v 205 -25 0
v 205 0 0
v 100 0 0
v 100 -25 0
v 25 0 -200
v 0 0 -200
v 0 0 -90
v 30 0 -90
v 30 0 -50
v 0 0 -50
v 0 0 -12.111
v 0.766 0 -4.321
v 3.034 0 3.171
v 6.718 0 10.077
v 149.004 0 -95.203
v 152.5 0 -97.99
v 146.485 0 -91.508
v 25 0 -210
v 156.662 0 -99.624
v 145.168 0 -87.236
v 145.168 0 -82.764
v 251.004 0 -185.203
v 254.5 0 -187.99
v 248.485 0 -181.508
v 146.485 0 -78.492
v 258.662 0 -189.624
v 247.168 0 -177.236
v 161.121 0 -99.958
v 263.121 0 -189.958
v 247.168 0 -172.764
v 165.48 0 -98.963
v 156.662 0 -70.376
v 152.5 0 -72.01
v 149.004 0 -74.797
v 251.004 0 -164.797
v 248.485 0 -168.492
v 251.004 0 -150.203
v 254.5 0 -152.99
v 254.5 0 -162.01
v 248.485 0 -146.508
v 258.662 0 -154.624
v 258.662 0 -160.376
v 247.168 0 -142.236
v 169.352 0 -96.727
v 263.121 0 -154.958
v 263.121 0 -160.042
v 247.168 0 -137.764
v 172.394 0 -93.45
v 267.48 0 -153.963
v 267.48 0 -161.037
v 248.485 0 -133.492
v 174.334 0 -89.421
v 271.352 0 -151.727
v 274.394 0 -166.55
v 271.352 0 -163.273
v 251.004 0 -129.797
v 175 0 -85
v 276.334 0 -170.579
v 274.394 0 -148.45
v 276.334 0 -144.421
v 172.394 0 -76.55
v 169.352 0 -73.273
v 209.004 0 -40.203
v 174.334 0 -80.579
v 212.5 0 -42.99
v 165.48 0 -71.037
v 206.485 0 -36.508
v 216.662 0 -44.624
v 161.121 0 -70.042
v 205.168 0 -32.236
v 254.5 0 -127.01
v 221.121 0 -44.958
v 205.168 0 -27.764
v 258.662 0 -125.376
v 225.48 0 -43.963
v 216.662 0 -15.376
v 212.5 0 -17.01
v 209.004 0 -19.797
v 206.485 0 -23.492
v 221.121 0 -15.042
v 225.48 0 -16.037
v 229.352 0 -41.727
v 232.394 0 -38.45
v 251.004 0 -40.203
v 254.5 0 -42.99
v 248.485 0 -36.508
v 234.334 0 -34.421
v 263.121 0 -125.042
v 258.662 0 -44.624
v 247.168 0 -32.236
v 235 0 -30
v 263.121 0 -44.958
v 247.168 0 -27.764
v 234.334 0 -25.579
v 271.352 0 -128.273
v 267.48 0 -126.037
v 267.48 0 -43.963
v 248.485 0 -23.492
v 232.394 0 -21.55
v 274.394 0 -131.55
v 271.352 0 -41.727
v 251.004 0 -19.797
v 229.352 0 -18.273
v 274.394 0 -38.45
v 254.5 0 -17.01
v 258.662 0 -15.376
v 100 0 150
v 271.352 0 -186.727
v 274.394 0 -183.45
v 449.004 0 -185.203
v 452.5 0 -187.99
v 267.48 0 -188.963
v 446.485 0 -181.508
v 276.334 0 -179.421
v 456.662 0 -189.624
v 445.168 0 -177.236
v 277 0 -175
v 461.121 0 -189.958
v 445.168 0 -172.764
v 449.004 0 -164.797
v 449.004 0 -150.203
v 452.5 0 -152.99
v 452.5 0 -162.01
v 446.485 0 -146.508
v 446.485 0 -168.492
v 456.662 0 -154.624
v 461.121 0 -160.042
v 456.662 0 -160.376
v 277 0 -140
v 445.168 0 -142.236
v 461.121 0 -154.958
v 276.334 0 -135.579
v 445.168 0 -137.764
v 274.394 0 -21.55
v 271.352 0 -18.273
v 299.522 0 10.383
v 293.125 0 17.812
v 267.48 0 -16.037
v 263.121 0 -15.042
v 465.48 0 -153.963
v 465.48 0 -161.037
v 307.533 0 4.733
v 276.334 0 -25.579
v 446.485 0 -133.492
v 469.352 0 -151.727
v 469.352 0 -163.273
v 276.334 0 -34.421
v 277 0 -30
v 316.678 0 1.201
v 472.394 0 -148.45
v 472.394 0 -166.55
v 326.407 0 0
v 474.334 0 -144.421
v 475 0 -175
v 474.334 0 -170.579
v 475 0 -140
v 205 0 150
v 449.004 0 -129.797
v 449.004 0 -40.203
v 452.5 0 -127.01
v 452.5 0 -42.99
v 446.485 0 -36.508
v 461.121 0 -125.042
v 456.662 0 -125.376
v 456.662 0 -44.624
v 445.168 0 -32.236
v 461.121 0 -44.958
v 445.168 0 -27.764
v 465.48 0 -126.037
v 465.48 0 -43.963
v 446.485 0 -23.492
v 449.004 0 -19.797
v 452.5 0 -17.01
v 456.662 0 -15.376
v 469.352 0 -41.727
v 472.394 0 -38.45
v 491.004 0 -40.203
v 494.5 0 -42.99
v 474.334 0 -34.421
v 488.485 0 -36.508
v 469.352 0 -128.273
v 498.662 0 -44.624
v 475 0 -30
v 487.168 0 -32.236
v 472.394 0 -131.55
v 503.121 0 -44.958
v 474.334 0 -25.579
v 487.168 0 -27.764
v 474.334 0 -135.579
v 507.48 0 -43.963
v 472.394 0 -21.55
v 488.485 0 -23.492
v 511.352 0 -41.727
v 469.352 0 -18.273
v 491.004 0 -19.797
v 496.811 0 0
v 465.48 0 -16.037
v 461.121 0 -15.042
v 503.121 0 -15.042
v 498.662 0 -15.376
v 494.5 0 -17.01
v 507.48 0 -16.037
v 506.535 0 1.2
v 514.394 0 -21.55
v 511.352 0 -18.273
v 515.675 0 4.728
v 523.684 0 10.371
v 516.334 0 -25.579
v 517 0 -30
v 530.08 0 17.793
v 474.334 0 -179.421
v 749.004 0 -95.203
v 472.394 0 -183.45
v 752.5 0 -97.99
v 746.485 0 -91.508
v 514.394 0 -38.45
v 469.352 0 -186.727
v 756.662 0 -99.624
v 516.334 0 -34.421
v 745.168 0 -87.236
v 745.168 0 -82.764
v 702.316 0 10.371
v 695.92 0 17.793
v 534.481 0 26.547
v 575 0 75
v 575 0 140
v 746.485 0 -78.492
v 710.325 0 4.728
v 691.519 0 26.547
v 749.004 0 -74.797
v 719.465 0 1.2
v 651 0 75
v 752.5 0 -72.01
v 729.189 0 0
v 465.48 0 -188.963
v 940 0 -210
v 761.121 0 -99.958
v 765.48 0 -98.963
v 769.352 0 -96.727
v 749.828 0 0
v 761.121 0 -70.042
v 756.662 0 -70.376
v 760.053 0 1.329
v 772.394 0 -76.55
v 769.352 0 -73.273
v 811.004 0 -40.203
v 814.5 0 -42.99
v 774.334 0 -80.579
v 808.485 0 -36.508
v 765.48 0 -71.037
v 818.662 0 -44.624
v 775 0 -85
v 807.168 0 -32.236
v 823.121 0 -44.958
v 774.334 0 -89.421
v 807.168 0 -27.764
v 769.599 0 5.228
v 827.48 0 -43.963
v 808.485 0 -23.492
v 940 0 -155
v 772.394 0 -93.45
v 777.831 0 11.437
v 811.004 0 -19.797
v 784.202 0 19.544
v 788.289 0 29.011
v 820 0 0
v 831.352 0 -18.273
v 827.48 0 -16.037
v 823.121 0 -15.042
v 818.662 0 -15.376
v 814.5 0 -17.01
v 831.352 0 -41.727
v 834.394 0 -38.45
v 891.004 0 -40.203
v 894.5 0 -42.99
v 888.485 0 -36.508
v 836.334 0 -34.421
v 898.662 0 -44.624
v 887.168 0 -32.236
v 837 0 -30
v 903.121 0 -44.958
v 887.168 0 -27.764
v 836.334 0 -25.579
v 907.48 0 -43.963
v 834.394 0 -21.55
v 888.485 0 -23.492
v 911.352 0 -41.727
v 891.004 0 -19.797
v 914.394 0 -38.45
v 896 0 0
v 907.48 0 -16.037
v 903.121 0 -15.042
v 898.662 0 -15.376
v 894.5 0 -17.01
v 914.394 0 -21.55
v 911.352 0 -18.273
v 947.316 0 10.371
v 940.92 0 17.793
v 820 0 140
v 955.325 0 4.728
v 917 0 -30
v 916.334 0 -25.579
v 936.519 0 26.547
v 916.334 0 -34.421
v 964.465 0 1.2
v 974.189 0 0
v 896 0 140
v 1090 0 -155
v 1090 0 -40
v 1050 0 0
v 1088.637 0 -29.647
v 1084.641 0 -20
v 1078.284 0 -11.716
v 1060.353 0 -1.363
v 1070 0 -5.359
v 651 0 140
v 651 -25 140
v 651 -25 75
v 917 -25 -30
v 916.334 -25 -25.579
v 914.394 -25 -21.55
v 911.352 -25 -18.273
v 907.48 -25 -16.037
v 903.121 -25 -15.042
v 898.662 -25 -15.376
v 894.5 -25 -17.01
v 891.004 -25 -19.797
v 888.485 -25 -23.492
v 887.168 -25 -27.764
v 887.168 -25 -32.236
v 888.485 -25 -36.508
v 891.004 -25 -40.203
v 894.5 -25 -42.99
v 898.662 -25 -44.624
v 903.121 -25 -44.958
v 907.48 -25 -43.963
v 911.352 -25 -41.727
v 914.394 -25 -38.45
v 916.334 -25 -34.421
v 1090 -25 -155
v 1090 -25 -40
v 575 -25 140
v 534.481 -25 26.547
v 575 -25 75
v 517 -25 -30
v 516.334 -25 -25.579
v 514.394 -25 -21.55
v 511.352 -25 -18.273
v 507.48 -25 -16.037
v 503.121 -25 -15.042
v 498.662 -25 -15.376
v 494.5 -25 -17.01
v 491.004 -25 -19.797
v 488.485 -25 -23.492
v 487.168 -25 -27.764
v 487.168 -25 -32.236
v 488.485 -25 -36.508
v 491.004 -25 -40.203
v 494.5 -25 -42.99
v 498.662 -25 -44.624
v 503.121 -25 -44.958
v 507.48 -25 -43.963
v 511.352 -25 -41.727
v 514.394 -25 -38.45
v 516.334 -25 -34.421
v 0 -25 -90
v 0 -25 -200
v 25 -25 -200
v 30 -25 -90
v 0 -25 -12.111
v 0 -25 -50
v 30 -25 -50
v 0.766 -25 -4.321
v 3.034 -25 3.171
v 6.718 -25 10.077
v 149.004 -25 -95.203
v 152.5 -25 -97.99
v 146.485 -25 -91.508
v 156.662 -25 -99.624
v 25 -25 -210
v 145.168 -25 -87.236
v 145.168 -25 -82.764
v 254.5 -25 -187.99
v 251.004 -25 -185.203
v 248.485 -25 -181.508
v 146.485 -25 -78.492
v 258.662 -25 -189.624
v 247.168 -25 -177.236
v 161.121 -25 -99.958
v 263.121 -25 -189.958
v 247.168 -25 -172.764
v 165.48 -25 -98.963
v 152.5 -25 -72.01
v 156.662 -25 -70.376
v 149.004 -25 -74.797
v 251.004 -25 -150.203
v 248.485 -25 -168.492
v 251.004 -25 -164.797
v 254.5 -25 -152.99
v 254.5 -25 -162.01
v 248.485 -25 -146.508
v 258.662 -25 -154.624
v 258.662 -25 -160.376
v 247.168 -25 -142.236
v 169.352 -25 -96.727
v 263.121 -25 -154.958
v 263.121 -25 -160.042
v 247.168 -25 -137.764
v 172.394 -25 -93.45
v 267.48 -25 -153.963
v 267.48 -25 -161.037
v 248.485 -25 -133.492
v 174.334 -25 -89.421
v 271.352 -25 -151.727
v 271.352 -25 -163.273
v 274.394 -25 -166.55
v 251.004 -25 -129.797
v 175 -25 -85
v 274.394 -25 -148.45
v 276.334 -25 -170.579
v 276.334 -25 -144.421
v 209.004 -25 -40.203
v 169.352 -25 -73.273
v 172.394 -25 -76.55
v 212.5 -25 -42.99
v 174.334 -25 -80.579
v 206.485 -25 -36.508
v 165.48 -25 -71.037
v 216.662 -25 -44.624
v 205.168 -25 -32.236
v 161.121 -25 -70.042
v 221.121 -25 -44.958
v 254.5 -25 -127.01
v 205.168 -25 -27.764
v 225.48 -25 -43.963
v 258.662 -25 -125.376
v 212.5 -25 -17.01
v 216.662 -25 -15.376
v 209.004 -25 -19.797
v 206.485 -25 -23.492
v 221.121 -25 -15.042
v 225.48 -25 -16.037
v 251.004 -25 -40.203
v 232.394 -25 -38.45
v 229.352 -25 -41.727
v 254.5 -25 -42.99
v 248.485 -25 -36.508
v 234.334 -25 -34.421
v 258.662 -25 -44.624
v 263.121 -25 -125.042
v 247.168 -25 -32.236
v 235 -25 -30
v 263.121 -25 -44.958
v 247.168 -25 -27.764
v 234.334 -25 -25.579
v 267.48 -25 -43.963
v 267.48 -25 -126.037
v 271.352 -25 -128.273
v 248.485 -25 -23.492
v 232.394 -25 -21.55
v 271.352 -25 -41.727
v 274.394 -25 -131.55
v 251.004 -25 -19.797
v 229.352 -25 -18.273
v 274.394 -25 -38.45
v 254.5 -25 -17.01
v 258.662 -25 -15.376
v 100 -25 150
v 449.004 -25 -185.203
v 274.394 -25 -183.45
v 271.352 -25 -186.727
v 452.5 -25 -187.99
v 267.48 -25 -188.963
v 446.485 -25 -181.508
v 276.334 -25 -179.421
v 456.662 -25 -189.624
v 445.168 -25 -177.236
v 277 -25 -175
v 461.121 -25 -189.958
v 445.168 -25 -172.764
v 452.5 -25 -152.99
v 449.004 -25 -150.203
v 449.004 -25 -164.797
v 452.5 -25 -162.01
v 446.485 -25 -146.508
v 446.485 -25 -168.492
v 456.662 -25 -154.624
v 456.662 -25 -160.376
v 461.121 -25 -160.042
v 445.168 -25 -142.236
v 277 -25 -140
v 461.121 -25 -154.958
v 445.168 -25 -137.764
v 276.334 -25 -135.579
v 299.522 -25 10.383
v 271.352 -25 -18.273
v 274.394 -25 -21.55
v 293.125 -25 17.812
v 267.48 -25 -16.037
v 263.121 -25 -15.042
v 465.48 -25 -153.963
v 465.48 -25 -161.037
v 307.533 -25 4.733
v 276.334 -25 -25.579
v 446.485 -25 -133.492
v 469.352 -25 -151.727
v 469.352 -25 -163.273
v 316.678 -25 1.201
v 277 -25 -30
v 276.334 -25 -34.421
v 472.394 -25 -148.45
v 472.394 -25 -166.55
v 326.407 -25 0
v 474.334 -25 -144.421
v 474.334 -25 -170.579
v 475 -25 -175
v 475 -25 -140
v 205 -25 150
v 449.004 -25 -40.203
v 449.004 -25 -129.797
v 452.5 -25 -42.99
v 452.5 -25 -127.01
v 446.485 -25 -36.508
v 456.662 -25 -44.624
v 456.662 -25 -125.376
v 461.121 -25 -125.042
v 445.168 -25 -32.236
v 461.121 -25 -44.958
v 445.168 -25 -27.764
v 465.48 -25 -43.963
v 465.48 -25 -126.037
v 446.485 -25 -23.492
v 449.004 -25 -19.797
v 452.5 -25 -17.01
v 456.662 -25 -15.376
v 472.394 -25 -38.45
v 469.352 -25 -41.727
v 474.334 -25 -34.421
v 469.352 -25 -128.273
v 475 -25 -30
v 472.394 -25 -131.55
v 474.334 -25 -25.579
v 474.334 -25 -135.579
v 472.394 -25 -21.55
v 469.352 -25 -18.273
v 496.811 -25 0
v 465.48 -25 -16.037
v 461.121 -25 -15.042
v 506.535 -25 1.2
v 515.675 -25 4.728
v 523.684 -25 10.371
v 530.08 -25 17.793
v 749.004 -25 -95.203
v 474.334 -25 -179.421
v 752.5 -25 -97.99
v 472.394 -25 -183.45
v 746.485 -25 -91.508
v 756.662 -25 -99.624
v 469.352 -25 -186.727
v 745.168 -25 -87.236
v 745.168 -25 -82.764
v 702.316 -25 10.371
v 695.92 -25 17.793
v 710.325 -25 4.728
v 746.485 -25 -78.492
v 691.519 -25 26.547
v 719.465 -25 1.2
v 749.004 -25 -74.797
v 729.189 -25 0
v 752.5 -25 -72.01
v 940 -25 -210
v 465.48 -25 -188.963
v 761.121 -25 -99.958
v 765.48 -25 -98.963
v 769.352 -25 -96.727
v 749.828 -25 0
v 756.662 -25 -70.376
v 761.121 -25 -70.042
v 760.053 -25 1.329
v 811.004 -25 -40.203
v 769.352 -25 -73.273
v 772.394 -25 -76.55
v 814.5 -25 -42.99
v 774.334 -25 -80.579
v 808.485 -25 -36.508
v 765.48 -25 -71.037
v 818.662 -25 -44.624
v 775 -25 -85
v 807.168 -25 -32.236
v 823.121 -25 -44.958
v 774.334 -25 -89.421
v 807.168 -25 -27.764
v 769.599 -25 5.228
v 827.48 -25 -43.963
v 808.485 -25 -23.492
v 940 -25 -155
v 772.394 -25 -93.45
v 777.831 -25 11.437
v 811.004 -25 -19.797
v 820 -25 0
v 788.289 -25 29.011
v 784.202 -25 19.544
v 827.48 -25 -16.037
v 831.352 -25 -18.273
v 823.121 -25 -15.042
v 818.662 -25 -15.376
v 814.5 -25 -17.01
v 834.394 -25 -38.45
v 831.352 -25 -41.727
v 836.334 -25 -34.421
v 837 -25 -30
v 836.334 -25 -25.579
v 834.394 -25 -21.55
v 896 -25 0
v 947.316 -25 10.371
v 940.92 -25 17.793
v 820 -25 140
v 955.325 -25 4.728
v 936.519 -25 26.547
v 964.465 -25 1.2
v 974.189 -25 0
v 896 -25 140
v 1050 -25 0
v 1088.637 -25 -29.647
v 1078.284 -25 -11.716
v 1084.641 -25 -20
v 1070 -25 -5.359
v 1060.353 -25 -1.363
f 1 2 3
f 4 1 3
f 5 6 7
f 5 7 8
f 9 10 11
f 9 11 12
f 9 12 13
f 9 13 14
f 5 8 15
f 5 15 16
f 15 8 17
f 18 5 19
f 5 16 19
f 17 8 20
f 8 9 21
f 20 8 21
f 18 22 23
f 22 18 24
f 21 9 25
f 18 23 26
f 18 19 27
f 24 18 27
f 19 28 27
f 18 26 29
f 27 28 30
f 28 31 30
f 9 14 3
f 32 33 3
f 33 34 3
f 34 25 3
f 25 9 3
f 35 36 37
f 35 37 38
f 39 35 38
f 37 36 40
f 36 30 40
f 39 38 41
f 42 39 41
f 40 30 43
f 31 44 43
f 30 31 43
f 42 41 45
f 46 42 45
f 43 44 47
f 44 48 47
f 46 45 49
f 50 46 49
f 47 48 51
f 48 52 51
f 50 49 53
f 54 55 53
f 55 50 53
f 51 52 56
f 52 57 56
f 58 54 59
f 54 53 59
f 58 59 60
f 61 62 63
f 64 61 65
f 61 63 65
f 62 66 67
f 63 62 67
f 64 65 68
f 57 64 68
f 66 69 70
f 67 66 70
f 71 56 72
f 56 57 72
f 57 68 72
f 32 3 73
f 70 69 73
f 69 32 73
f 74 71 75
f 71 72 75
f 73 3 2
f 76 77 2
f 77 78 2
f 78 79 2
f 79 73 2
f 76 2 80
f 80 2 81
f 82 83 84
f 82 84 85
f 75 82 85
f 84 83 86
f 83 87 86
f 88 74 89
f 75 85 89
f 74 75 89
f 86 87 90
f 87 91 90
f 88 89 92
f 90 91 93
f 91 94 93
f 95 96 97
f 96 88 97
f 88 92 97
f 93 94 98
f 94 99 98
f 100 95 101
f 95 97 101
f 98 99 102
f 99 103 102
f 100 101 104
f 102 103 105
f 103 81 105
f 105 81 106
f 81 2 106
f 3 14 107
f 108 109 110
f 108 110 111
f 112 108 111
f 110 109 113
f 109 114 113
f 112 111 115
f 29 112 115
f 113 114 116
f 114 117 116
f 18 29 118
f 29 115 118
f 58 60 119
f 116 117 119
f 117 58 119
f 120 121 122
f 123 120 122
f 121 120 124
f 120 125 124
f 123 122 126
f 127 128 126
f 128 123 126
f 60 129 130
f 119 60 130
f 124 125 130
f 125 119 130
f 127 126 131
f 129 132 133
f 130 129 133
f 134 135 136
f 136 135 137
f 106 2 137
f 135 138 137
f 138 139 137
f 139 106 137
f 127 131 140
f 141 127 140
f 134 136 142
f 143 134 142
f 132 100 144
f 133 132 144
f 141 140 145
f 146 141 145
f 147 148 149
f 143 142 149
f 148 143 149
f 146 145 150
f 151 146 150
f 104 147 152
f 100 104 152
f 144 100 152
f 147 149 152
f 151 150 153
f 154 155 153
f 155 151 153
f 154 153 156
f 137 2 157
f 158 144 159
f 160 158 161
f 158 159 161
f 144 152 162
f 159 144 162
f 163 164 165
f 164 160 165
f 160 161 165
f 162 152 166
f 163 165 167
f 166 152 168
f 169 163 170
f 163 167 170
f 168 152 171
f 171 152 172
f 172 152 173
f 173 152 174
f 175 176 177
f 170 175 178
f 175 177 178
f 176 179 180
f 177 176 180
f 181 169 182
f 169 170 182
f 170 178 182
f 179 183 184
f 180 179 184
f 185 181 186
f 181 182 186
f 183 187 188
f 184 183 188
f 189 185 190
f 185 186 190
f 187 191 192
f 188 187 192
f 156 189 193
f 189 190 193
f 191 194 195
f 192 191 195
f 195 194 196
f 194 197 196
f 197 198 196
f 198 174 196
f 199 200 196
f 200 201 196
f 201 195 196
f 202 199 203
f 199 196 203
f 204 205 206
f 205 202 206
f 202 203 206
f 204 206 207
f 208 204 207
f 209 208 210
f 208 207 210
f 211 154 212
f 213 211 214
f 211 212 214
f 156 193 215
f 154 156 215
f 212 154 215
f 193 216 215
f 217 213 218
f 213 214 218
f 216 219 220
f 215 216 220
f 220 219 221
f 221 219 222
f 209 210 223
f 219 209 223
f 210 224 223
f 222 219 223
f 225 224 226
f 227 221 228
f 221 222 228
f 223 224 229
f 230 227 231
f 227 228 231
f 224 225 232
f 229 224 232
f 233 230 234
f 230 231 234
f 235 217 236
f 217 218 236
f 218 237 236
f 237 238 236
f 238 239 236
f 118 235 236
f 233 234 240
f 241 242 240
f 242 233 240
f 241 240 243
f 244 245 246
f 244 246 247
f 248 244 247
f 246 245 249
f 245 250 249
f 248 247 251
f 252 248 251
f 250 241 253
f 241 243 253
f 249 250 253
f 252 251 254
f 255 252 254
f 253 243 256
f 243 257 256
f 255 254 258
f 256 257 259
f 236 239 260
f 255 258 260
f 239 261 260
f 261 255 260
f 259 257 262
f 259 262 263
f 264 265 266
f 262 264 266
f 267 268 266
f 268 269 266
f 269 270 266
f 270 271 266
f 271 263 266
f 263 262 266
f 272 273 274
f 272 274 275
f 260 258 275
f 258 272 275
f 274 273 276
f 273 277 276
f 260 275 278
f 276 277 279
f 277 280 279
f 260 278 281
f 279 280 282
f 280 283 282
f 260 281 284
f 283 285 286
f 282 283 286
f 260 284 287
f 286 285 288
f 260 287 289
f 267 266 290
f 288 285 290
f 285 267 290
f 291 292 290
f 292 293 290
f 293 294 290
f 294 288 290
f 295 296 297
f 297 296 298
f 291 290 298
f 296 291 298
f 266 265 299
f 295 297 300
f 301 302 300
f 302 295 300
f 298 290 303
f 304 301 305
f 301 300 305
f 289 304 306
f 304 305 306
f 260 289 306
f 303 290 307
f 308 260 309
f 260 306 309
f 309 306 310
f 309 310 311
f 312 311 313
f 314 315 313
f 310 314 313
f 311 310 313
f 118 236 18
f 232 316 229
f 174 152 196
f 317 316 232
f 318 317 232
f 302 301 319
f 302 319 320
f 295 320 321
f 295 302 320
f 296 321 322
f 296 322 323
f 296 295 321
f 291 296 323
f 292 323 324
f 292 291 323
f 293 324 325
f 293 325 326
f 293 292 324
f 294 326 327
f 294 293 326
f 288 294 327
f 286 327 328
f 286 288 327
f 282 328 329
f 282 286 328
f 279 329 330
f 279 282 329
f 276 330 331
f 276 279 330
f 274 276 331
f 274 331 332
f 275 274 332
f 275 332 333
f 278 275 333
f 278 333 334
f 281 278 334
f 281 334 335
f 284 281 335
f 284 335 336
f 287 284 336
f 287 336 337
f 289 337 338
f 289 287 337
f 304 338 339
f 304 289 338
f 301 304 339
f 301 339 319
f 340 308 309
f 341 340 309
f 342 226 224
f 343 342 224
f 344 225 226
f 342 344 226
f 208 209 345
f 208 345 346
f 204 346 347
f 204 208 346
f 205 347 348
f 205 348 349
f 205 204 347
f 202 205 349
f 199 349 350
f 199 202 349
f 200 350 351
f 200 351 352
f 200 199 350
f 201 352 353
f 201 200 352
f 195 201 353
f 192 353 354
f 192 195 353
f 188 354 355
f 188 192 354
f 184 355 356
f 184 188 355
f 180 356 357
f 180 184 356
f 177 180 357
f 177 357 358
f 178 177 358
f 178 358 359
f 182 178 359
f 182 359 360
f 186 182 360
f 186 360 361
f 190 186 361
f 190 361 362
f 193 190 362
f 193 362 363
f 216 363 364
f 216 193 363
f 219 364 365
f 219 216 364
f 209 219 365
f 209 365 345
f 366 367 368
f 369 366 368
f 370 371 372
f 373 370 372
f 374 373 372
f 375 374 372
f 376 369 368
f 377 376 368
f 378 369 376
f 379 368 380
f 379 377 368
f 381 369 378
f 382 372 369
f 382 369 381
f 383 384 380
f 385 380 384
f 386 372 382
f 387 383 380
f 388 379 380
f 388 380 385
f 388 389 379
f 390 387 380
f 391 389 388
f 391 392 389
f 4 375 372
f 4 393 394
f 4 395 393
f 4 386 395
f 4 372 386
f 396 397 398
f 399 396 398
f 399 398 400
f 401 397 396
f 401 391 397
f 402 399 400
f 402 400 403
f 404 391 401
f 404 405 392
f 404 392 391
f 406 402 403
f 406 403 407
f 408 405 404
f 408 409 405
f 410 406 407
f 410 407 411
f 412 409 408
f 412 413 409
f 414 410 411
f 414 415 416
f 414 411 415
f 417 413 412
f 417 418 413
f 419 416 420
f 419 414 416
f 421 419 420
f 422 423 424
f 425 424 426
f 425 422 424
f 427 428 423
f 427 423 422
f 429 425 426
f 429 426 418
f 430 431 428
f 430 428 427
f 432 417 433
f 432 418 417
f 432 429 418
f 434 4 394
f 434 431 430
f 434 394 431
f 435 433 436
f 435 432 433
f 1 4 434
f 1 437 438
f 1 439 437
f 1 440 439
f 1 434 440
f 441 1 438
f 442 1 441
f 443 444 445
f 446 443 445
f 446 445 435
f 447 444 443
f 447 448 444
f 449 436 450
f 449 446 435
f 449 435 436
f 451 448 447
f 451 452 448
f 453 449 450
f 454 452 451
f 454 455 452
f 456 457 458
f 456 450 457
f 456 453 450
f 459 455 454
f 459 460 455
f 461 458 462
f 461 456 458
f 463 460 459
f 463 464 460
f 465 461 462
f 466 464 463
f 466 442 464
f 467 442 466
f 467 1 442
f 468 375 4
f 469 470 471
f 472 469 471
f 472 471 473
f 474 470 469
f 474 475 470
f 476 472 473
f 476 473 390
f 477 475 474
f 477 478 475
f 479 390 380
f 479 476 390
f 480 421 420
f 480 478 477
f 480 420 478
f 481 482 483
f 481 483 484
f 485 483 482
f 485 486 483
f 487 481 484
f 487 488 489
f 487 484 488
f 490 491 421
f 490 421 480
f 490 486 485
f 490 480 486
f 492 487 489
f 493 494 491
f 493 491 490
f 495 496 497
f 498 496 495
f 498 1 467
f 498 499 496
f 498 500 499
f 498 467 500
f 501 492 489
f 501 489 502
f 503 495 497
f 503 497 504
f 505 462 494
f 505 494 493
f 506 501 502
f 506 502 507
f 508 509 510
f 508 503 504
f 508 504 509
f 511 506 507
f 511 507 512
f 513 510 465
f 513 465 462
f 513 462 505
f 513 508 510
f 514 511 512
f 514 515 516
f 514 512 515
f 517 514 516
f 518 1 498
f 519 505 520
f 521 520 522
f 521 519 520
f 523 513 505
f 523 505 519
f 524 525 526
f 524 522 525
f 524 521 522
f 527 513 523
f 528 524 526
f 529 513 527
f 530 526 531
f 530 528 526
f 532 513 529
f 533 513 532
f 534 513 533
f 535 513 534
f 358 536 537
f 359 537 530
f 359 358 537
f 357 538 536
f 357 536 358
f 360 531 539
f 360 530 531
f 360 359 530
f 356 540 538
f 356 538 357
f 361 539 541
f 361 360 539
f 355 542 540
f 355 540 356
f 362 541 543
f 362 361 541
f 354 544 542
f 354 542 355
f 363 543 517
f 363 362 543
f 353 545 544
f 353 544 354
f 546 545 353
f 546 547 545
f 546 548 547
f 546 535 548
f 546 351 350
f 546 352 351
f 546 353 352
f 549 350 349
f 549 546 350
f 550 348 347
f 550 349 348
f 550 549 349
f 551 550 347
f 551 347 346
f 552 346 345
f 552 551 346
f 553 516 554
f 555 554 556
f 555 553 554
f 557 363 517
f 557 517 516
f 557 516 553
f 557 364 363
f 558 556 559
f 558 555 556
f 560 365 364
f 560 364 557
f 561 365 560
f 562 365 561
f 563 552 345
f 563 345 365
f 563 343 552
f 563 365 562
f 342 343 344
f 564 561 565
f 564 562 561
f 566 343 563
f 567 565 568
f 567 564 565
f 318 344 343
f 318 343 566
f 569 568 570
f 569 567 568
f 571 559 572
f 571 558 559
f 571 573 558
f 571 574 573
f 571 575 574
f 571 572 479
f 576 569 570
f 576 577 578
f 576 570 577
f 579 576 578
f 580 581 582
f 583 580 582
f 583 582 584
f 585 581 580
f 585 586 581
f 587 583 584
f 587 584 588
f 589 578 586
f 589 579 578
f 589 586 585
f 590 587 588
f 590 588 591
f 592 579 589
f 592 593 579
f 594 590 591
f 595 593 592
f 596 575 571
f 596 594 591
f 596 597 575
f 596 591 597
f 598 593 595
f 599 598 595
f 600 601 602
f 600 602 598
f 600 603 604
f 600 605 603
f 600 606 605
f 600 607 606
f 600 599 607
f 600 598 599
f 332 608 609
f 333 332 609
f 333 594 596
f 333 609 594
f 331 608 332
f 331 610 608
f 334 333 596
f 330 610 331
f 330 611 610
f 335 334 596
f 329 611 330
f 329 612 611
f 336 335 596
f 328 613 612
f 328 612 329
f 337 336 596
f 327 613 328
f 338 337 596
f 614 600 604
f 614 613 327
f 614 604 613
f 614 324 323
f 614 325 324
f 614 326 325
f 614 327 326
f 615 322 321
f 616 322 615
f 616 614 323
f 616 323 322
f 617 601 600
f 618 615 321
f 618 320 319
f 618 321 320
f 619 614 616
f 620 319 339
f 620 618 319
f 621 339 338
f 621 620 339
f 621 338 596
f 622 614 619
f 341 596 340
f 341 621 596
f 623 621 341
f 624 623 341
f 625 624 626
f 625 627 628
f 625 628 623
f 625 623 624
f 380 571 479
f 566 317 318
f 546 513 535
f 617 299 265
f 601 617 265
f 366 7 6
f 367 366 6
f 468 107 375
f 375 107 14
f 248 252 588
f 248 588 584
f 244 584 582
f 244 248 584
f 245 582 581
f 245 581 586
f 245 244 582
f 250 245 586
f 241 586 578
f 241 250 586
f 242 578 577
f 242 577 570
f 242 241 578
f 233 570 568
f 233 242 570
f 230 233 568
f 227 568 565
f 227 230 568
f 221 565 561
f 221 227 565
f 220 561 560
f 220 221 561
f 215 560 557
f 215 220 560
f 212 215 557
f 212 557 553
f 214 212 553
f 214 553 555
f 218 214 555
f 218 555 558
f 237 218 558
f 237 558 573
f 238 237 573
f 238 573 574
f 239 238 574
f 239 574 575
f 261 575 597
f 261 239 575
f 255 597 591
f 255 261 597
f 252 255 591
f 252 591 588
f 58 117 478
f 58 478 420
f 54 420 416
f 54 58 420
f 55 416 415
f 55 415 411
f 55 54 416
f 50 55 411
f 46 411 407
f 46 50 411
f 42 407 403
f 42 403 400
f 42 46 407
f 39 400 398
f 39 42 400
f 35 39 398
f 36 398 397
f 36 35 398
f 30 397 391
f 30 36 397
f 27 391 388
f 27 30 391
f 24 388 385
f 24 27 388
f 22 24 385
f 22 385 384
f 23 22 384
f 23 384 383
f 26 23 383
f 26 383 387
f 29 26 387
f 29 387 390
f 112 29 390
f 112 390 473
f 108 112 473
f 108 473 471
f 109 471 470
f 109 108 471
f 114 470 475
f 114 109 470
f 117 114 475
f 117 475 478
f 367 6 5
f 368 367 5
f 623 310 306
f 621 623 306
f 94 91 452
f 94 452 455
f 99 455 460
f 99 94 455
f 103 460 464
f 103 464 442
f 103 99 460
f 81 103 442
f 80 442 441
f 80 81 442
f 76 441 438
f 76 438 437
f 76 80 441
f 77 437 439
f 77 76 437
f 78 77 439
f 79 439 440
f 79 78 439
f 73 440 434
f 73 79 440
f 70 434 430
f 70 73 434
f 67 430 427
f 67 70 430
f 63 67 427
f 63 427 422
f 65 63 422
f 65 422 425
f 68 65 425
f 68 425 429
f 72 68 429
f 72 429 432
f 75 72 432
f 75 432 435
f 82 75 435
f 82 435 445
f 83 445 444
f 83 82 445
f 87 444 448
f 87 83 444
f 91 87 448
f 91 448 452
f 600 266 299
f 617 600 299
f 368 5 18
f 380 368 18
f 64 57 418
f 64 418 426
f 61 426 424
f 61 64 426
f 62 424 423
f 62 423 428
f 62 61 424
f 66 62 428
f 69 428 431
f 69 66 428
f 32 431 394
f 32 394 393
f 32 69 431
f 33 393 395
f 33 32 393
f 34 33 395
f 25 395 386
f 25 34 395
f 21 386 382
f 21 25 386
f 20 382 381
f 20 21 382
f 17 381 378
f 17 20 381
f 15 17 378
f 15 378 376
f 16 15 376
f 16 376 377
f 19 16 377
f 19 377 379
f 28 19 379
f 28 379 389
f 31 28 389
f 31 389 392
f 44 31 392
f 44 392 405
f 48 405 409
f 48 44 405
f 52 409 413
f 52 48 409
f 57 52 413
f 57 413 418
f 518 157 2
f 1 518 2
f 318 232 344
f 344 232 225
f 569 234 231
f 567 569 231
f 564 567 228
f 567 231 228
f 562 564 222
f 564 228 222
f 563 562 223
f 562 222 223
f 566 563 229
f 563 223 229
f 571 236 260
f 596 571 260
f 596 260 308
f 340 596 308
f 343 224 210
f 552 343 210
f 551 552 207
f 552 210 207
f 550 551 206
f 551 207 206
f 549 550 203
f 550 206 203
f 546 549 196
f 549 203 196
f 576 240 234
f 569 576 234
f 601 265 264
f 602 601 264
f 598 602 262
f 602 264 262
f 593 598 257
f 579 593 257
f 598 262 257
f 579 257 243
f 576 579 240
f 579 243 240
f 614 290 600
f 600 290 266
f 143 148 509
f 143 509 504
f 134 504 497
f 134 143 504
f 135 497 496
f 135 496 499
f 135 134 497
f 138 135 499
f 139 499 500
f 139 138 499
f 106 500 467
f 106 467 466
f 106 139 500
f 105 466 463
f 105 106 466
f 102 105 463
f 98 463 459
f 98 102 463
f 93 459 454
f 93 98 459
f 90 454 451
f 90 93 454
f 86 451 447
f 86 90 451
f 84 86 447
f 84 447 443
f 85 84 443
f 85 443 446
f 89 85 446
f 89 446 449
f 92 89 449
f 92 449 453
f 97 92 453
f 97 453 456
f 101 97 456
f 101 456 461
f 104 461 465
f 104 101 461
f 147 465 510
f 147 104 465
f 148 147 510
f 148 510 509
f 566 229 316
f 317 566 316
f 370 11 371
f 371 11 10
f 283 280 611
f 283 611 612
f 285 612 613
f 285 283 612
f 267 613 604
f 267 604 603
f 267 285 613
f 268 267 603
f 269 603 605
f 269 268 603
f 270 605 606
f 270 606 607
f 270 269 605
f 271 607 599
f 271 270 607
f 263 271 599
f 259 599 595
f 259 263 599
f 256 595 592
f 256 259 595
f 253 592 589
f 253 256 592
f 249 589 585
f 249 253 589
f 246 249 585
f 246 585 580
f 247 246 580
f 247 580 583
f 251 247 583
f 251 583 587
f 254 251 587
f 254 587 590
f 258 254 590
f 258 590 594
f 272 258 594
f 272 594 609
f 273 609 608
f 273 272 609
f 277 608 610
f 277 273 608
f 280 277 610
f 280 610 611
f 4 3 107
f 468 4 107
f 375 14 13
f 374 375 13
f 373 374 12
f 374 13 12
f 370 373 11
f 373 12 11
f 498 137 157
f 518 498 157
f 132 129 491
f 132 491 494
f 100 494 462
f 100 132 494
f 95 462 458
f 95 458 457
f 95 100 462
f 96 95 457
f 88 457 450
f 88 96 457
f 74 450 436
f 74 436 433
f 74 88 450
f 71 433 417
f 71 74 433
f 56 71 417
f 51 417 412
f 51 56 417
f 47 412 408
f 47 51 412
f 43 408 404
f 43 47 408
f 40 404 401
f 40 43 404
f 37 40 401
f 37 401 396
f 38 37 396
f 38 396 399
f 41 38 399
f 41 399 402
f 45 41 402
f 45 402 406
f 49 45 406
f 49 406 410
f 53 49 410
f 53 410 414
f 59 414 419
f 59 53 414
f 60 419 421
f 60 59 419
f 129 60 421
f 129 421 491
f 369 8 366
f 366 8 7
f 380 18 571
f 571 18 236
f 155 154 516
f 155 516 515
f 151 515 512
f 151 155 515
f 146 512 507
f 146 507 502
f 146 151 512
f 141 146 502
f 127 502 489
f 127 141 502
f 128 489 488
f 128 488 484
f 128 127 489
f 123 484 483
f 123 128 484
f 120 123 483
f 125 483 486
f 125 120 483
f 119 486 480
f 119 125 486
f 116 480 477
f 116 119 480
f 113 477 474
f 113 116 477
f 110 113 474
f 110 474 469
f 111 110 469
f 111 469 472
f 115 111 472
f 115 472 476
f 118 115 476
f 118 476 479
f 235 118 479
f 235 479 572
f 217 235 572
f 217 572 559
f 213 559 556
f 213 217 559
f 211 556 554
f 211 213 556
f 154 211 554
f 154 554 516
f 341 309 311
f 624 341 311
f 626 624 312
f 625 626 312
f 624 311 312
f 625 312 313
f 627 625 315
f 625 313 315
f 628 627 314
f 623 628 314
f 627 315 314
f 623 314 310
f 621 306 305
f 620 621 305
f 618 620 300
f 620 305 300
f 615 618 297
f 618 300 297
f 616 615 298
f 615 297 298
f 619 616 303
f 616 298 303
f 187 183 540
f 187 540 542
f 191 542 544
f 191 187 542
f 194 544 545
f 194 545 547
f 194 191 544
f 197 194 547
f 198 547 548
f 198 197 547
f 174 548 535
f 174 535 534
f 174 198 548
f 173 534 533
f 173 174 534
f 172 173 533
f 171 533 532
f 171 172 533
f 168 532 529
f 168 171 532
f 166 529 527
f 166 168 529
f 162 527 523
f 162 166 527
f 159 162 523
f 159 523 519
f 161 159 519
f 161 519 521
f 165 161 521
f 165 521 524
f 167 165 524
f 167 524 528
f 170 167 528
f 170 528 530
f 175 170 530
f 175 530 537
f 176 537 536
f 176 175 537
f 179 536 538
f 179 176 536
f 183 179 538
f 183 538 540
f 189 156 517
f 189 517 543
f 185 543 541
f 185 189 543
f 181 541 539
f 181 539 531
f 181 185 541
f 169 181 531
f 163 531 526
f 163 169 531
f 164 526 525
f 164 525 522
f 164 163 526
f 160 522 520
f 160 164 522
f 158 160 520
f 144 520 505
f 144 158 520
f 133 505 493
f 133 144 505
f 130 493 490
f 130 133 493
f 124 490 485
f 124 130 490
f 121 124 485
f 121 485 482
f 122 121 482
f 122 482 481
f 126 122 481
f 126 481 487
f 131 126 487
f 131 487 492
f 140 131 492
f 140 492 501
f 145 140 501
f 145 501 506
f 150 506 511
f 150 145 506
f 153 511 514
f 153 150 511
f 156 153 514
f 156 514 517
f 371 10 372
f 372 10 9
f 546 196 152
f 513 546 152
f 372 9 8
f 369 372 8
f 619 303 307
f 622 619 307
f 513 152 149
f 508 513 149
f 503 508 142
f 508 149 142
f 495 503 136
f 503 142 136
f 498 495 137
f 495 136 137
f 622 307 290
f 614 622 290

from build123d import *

# Parameters (mm, degrees)
F0_R     = 15
F1_DEPTH = 25


with BuildPart() as f1:
    # F0 (on Front) → F1 (new body)
    with BuildSketch(Plane.XZ):
        with BuildLine():
            Line((100, 150), (6.717988, 10.076982))
            ThreePointArc((6.717988, 10.076982), (1.716319, -0.51966), (0, -12.111026))
            Line((0, -12.111026), (0, -50))
            Line((0, -50), (30, -50))
            Line((30, -50), (30, -90))
            Line((30, -90), (0, -90))
            Line((0, -90), (0, -200))
            Line((0, -200), (25, -200))
            Line((25, -200), (25, -210))
            Line((25, -210), (940, -210))
            Line((940, -210), (940, -155))
            Line((940, -155), (1090, -155))
            Line((1090, -155), (1090, -40))
            ThreePointArc((1090, -40), (1078.284271, -11.715729), (1050, 0))
            Line((1050, 0), (974.188768, 0))
            ThreePointArc((974.188768, 0), (951.14683, 7.303378), (936.519091, 26.546544))
            Line((936.519091, 26.546544), (896, 140))
            Line((896, 140), (896, 0))
            Line((896, 0), (820, 0))
            Line((820, 0), (820, 140))
            Line((820, 140), (788.288901, 29.011155))
            ThreePointArc((788.288901, 29.011155), (773.915764, 8.066054), (749.827943, 0))
            Line((749.827943, 0), (729.188768, 0))
            ThreePointArc((729.188768, 0), (706.14683, 7.303378), (691.519091, 26.546544))
            Line((691.519091, 26.546544), (651, 140))
            Line((651, 140), (651, 75))
            Line((651, 75), (575, 75))
            Line((575, 75), (575, 140))
            Line((575, 140), (534.480909, 26.546544))
            ThreePointArc((534.480909, 26.546544), (519.85317, 7.303378), (496.811232, 0))
            Line((496.811232, 0), (326.40735, 0))
            ThreePointArc((326.40735, 0), (307.533033, 4.733016), (293.125339, 17.811992))
            Line((293.125339, 17.811992), (205, 150))
            Line((205, 150), (205, 0))
            Line((205, 0), (100, 0))
            Line((100, 0), (100, 150))
        make_face()
        with Locations((262, -175)):
            Circle(F0_R, mode=Mode.SUBTRACT)
        with Locations((262, -140)):
            Circle(F0_R, mode=Mode.SUBTRACT)
        with Locations((460, -175)):
            Circle(F0_R, mode=Mode.SUBTRACT)
        with Locations((460, -140)):
            Circle(F0_R, mode=Mode.SUBTRACT)
        with Locations((160, -85)):
            Circle(F0_R, mode=Mode.SUBTRACT)
        with Locations((760, -85)):
            Circle(F0_R, mode=Mode.SUBTRACT)
        with Locations((220, -30)):
            Circle(F0_R, mode=Mode.SUBTRACT)
        with Locations((262, -30)):
            Circle(F0_R, mode=Mode.SUBTRACT)
        with Locations((460, -30)):
            Circle(F0_R, mode=Mode.SUBTRACT)
        with Locations((502, -30)):
            Circle(F0_R, mode=Mode.SUBTRACT)
        with Locations((822, -30)):
            Circle(F0_R, mode=Mode.SUBTRACT)
        with Locations((902, -30)):
            Circle(F0_R, mode=Mode.SUBTRACT)
    extrude(amount=F1_DEPTH)


solid = f1.part
